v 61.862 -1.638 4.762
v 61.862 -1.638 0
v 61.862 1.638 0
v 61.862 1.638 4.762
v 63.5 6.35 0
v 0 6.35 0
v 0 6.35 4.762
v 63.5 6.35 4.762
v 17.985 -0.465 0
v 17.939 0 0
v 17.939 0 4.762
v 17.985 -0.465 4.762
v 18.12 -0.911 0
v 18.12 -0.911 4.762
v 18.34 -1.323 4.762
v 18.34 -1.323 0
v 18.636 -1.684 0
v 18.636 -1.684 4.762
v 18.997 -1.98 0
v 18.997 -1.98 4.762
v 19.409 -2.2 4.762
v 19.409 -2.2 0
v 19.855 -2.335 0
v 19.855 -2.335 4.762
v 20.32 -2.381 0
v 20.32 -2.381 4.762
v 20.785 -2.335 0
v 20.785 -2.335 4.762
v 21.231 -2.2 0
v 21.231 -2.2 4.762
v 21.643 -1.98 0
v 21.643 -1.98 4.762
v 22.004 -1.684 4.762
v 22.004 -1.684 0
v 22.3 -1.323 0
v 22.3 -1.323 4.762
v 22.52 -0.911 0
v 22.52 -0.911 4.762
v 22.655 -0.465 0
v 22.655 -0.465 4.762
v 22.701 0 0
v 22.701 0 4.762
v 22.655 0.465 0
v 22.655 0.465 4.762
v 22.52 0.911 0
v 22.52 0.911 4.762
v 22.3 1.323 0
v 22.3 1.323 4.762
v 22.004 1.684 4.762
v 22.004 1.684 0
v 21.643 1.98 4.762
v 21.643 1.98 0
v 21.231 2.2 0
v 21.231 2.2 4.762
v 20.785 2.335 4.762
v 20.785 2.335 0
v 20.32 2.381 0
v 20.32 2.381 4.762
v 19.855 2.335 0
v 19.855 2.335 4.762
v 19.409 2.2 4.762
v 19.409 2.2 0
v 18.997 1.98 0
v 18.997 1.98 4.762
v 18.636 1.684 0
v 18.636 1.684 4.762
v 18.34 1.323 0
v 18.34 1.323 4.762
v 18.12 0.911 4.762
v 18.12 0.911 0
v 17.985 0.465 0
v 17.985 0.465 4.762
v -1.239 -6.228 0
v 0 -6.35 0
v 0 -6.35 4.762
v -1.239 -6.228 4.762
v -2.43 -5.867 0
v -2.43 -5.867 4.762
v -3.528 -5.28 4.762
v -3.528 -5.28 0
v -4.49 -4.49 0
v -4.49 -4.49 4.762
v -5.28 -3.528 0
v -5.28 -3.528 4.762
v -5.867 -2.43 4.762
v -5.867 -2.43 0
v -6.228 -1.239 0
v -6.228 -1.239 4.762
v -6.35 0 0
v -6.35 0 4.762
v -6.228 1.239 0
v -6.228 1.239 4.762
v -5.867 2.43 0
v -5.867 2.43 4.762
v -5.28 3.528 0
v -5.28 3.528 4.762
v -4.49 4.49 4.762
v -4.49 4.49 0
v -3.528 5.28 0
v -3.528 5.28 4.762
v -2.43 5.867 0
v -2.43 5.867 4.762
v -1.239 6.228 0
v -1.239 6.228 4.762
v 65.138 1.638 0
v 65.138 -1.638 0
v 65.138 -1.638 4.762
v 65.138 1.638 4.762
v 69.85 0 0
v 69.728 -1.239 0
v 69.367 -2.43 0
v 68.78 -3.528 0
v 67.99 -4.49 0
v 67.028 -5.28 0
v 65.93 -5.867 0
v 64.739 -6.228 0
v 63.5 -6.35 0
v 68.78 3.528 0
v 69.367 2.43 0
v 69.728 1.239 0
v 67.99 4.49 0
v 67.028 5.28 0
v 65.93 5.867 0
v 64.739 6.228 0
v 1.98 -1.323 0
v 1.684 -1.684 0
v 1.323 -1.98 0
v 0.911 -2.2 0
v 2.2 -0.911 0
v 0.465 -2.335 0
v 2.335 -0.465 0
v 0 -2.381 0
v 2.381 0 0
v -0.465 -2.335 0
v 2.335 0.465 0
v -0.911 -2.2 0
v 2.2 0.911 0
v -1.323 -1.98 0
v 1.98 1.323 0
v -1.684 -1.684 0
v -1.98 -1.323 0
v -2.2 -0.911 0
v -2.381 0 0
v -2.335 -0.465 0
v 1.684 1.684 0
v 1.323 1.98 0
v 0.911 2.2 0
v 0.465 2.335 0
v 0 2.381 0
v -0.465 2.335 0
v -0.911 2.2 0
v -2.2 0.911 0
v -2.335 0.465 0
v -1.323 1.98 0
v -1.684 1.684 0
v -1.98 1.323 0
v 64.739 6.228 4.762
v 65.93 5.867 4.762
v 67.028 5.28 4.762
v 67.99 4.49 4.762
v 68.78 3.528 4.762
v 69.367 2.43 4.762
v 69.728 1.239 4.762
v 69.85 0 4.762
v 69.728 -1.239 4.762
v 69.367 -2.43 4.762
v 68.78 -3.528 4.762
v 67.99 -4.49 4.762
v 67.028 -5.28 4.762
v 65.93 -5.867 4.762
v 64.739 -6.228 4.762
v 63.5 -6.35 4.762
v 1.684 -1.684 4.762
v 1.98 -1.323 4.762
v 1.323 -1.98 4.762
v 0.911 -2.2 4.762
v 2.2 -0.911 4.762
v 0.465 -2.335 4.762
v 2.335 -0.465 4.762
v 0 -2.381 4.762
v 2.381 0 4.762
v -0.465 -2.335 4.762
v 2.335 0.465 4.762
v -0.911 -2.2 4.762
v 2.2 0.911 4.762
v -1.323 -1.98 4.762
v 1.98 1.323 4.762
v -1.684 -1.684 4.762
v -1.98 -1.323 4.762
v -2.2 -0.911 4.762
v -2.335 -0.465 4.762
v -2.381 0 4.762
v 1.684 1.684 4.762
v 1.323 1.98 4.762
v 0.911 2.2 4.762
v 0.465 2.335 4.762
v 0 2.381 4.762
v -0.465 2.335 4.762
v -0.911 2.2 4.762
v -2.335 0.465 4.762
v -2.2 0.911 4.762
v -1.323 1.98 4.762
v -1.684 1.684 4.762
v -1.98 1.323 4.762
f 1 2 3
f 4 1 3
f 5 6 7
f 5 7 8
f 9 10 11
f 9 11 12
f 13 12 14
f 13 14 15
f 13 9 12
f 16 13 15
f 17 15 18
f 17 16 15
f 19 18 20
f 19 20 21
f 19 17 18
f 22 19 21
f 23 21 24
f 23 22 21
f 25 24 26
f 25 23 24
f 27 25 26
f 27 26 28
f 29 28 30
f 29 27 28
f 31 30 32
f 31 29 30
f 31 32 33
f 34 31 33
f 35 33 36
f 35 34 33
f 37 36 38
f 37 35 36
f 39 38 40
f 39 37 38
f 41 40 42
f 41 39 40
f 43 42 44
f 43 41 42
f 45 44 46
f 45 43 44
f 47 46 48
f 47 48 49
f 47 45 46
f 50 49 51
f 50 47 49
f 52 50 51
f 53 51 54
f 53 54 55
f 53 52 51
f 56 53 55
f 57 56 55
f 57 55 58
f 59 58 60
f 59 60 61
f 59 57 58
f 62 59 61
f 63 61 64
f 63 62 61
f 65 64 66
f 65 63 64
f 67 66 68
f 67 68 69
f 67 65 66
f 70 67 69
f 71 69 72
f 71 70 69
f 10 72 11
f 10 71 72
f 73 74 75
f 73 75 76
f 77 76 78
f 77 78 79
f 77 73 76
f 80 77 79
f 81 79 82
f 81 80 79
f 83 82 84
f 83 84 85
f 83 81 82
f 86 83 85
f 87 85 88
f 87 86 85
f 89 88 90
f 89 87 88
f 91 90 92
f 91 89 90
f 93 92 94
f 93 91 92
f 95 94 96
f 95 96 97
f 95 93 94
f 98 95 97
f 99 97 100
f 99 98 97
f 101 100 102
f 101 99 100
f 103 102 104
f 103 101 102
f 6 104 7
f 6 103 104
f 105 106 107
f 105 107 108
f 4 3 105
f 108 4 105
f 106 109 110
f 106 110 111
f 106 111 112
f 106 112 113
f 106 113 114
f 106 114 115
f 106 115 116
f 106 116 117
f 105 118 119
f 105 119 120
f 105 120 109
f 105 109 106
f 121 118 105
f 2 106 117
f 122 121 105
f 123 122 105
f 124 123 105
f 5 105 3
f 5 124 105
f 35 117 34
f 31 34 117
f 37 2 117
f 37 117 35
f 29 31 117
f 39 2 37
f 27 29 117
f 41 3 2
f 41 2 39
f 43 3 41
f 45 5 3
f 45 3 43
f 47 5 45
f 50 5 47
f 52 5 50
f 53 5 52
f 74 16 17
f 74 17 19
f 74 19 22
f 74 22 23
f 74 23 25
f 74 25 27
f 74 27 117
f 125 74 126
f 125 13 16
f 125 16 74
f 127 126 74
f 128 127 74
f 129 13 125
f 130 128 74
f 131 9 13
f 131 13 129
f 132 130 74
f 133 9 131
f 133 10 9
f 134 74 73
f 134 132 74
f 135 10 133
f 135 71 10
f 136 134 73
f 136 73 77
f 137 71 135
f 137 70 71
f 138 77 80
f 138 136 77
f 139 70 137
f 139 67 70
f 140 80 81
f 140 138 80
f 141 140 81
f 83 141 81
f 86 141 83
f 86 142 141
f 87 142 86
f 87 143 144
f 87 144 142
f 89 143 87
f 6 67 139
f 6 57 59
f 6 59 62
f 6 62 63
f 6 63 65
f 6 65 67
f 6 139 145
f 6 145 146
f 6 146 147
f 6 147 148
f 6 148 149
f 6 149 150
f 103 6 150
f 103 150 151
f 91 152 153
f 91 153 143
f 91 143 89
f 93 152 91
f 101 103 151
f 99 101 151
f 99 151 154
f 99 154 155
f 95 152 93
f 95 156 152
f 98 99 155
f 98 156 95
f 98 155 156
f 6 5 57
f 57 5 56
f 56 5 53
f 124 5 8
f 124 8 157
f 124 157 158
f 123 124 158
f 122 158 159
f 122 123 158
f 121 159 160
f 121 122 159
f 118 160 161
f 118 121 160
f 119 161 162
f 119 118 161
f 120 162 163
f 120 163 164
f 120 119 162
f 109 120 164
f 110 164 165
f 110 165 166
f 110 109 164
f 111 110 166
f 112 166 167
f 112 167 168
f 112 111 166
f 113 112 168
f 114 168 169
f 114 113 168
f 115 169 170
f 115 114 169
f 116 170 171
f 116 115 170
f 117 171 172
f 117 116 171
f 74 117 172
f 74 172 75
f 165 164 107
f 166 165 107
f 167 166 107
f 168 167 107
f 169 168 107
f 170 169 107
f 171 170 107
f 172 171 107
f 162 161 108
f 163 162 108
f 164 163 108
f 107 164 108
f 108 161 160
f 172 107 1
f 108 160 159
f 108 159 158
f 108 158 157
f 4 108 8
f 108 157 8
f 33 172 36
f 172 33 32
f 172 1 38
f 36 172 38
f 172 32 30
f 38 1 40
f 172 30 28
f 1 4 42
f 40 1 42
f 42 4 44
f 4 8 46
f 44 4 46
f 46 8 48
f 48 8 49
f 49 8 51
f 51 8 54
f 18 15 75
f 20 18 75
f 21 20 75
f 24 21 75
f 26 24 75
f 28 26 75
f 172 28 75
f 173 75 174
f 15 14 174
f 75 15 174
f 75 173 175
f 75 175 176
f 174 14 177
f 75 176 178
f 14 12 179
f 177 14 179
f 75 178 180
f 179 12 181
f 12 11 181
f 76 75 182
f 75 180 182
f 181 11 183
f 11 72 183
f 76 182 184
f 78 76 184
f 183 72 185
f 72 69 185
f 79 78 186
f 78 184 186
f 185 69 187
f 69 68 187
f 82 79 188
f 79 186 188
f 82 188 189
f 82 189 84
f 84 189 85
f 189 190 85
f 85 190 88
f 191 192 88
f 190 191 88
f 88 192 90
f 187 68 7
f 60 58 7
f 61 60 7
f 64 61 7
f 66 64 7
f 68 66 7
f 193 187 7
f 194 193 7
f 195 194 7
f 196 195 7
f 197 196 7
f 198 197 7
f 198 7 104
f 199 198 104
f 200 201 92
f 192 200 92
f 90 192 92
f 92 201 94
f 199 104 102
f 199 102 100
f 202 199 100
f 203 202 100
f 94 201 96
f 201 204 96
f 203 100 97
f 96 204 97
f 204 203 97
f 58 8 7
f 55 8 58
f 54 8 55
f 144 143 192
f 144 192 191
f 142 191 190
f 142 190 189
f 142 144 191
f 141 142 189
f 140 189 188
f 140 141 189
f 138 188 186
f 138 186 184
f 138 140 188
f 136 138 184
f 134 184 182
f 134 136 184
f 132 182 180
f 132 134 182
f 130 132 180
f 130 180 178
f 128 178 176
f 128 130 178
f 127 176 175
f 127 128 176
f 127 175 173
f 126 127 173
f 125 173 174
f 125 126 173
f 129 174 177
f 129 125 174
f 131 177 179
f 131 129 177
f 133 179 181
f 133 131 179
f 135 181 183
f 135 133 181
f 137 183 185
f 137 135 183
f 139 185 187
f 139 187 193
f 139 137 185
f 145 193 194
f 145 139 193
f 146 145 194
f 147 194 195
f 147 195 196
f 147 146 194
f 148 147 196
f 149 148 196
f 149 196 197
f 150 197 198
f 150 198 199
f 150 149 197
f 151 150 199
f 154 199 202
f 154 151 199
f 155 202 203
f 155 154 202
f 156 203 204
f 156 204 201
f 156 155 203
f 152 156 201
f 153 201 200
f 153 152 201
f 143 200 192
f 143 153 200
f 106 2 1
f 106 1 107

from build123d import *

# Parameters (mm, degrees)
SKETCH1_R           = 2.38125
SKETCH1_W           = 3.2766
SKETCH1_H           = 3.2766
BOSS_EXTRUDE1_DEPTH = 4.7625


with BuildPart() as part:
    # Sketch1 → Boss-Extrude1 (new body)
    with BuildSketch(Plane.XY):
        with BuildLine():
            Line((0, 6.35), (63.5, 6.35))
            ThreePointArc((63.5, 6.35), (69.85, 0), (63.5, -6.35))
            Line((63.5, -6.35), (0, -6.35))
            ThreePointArc((0, -6.35), (-6.35, 0), (0, 6.35))
        make_face()
        with Locations(Location((0, 0, 0), (0, 0, 180))):
            Circle(SKETCH1_R, mode=Mode.SUBTRACT)
        with Locations(Location((20.32, 0, 0), (0, 0, 180))):
            Circle(SKETCH1_R, mode=Mode.SUBTRACT)
        with Locations((63.5, 0)):
            Rectangle(SKETCH1_W, SKETCH1_H, mode=Mode.SUBTRACT)
    extrude(amount=BOSS_EXTRUDE1_DEPTH)


solid = part.part
